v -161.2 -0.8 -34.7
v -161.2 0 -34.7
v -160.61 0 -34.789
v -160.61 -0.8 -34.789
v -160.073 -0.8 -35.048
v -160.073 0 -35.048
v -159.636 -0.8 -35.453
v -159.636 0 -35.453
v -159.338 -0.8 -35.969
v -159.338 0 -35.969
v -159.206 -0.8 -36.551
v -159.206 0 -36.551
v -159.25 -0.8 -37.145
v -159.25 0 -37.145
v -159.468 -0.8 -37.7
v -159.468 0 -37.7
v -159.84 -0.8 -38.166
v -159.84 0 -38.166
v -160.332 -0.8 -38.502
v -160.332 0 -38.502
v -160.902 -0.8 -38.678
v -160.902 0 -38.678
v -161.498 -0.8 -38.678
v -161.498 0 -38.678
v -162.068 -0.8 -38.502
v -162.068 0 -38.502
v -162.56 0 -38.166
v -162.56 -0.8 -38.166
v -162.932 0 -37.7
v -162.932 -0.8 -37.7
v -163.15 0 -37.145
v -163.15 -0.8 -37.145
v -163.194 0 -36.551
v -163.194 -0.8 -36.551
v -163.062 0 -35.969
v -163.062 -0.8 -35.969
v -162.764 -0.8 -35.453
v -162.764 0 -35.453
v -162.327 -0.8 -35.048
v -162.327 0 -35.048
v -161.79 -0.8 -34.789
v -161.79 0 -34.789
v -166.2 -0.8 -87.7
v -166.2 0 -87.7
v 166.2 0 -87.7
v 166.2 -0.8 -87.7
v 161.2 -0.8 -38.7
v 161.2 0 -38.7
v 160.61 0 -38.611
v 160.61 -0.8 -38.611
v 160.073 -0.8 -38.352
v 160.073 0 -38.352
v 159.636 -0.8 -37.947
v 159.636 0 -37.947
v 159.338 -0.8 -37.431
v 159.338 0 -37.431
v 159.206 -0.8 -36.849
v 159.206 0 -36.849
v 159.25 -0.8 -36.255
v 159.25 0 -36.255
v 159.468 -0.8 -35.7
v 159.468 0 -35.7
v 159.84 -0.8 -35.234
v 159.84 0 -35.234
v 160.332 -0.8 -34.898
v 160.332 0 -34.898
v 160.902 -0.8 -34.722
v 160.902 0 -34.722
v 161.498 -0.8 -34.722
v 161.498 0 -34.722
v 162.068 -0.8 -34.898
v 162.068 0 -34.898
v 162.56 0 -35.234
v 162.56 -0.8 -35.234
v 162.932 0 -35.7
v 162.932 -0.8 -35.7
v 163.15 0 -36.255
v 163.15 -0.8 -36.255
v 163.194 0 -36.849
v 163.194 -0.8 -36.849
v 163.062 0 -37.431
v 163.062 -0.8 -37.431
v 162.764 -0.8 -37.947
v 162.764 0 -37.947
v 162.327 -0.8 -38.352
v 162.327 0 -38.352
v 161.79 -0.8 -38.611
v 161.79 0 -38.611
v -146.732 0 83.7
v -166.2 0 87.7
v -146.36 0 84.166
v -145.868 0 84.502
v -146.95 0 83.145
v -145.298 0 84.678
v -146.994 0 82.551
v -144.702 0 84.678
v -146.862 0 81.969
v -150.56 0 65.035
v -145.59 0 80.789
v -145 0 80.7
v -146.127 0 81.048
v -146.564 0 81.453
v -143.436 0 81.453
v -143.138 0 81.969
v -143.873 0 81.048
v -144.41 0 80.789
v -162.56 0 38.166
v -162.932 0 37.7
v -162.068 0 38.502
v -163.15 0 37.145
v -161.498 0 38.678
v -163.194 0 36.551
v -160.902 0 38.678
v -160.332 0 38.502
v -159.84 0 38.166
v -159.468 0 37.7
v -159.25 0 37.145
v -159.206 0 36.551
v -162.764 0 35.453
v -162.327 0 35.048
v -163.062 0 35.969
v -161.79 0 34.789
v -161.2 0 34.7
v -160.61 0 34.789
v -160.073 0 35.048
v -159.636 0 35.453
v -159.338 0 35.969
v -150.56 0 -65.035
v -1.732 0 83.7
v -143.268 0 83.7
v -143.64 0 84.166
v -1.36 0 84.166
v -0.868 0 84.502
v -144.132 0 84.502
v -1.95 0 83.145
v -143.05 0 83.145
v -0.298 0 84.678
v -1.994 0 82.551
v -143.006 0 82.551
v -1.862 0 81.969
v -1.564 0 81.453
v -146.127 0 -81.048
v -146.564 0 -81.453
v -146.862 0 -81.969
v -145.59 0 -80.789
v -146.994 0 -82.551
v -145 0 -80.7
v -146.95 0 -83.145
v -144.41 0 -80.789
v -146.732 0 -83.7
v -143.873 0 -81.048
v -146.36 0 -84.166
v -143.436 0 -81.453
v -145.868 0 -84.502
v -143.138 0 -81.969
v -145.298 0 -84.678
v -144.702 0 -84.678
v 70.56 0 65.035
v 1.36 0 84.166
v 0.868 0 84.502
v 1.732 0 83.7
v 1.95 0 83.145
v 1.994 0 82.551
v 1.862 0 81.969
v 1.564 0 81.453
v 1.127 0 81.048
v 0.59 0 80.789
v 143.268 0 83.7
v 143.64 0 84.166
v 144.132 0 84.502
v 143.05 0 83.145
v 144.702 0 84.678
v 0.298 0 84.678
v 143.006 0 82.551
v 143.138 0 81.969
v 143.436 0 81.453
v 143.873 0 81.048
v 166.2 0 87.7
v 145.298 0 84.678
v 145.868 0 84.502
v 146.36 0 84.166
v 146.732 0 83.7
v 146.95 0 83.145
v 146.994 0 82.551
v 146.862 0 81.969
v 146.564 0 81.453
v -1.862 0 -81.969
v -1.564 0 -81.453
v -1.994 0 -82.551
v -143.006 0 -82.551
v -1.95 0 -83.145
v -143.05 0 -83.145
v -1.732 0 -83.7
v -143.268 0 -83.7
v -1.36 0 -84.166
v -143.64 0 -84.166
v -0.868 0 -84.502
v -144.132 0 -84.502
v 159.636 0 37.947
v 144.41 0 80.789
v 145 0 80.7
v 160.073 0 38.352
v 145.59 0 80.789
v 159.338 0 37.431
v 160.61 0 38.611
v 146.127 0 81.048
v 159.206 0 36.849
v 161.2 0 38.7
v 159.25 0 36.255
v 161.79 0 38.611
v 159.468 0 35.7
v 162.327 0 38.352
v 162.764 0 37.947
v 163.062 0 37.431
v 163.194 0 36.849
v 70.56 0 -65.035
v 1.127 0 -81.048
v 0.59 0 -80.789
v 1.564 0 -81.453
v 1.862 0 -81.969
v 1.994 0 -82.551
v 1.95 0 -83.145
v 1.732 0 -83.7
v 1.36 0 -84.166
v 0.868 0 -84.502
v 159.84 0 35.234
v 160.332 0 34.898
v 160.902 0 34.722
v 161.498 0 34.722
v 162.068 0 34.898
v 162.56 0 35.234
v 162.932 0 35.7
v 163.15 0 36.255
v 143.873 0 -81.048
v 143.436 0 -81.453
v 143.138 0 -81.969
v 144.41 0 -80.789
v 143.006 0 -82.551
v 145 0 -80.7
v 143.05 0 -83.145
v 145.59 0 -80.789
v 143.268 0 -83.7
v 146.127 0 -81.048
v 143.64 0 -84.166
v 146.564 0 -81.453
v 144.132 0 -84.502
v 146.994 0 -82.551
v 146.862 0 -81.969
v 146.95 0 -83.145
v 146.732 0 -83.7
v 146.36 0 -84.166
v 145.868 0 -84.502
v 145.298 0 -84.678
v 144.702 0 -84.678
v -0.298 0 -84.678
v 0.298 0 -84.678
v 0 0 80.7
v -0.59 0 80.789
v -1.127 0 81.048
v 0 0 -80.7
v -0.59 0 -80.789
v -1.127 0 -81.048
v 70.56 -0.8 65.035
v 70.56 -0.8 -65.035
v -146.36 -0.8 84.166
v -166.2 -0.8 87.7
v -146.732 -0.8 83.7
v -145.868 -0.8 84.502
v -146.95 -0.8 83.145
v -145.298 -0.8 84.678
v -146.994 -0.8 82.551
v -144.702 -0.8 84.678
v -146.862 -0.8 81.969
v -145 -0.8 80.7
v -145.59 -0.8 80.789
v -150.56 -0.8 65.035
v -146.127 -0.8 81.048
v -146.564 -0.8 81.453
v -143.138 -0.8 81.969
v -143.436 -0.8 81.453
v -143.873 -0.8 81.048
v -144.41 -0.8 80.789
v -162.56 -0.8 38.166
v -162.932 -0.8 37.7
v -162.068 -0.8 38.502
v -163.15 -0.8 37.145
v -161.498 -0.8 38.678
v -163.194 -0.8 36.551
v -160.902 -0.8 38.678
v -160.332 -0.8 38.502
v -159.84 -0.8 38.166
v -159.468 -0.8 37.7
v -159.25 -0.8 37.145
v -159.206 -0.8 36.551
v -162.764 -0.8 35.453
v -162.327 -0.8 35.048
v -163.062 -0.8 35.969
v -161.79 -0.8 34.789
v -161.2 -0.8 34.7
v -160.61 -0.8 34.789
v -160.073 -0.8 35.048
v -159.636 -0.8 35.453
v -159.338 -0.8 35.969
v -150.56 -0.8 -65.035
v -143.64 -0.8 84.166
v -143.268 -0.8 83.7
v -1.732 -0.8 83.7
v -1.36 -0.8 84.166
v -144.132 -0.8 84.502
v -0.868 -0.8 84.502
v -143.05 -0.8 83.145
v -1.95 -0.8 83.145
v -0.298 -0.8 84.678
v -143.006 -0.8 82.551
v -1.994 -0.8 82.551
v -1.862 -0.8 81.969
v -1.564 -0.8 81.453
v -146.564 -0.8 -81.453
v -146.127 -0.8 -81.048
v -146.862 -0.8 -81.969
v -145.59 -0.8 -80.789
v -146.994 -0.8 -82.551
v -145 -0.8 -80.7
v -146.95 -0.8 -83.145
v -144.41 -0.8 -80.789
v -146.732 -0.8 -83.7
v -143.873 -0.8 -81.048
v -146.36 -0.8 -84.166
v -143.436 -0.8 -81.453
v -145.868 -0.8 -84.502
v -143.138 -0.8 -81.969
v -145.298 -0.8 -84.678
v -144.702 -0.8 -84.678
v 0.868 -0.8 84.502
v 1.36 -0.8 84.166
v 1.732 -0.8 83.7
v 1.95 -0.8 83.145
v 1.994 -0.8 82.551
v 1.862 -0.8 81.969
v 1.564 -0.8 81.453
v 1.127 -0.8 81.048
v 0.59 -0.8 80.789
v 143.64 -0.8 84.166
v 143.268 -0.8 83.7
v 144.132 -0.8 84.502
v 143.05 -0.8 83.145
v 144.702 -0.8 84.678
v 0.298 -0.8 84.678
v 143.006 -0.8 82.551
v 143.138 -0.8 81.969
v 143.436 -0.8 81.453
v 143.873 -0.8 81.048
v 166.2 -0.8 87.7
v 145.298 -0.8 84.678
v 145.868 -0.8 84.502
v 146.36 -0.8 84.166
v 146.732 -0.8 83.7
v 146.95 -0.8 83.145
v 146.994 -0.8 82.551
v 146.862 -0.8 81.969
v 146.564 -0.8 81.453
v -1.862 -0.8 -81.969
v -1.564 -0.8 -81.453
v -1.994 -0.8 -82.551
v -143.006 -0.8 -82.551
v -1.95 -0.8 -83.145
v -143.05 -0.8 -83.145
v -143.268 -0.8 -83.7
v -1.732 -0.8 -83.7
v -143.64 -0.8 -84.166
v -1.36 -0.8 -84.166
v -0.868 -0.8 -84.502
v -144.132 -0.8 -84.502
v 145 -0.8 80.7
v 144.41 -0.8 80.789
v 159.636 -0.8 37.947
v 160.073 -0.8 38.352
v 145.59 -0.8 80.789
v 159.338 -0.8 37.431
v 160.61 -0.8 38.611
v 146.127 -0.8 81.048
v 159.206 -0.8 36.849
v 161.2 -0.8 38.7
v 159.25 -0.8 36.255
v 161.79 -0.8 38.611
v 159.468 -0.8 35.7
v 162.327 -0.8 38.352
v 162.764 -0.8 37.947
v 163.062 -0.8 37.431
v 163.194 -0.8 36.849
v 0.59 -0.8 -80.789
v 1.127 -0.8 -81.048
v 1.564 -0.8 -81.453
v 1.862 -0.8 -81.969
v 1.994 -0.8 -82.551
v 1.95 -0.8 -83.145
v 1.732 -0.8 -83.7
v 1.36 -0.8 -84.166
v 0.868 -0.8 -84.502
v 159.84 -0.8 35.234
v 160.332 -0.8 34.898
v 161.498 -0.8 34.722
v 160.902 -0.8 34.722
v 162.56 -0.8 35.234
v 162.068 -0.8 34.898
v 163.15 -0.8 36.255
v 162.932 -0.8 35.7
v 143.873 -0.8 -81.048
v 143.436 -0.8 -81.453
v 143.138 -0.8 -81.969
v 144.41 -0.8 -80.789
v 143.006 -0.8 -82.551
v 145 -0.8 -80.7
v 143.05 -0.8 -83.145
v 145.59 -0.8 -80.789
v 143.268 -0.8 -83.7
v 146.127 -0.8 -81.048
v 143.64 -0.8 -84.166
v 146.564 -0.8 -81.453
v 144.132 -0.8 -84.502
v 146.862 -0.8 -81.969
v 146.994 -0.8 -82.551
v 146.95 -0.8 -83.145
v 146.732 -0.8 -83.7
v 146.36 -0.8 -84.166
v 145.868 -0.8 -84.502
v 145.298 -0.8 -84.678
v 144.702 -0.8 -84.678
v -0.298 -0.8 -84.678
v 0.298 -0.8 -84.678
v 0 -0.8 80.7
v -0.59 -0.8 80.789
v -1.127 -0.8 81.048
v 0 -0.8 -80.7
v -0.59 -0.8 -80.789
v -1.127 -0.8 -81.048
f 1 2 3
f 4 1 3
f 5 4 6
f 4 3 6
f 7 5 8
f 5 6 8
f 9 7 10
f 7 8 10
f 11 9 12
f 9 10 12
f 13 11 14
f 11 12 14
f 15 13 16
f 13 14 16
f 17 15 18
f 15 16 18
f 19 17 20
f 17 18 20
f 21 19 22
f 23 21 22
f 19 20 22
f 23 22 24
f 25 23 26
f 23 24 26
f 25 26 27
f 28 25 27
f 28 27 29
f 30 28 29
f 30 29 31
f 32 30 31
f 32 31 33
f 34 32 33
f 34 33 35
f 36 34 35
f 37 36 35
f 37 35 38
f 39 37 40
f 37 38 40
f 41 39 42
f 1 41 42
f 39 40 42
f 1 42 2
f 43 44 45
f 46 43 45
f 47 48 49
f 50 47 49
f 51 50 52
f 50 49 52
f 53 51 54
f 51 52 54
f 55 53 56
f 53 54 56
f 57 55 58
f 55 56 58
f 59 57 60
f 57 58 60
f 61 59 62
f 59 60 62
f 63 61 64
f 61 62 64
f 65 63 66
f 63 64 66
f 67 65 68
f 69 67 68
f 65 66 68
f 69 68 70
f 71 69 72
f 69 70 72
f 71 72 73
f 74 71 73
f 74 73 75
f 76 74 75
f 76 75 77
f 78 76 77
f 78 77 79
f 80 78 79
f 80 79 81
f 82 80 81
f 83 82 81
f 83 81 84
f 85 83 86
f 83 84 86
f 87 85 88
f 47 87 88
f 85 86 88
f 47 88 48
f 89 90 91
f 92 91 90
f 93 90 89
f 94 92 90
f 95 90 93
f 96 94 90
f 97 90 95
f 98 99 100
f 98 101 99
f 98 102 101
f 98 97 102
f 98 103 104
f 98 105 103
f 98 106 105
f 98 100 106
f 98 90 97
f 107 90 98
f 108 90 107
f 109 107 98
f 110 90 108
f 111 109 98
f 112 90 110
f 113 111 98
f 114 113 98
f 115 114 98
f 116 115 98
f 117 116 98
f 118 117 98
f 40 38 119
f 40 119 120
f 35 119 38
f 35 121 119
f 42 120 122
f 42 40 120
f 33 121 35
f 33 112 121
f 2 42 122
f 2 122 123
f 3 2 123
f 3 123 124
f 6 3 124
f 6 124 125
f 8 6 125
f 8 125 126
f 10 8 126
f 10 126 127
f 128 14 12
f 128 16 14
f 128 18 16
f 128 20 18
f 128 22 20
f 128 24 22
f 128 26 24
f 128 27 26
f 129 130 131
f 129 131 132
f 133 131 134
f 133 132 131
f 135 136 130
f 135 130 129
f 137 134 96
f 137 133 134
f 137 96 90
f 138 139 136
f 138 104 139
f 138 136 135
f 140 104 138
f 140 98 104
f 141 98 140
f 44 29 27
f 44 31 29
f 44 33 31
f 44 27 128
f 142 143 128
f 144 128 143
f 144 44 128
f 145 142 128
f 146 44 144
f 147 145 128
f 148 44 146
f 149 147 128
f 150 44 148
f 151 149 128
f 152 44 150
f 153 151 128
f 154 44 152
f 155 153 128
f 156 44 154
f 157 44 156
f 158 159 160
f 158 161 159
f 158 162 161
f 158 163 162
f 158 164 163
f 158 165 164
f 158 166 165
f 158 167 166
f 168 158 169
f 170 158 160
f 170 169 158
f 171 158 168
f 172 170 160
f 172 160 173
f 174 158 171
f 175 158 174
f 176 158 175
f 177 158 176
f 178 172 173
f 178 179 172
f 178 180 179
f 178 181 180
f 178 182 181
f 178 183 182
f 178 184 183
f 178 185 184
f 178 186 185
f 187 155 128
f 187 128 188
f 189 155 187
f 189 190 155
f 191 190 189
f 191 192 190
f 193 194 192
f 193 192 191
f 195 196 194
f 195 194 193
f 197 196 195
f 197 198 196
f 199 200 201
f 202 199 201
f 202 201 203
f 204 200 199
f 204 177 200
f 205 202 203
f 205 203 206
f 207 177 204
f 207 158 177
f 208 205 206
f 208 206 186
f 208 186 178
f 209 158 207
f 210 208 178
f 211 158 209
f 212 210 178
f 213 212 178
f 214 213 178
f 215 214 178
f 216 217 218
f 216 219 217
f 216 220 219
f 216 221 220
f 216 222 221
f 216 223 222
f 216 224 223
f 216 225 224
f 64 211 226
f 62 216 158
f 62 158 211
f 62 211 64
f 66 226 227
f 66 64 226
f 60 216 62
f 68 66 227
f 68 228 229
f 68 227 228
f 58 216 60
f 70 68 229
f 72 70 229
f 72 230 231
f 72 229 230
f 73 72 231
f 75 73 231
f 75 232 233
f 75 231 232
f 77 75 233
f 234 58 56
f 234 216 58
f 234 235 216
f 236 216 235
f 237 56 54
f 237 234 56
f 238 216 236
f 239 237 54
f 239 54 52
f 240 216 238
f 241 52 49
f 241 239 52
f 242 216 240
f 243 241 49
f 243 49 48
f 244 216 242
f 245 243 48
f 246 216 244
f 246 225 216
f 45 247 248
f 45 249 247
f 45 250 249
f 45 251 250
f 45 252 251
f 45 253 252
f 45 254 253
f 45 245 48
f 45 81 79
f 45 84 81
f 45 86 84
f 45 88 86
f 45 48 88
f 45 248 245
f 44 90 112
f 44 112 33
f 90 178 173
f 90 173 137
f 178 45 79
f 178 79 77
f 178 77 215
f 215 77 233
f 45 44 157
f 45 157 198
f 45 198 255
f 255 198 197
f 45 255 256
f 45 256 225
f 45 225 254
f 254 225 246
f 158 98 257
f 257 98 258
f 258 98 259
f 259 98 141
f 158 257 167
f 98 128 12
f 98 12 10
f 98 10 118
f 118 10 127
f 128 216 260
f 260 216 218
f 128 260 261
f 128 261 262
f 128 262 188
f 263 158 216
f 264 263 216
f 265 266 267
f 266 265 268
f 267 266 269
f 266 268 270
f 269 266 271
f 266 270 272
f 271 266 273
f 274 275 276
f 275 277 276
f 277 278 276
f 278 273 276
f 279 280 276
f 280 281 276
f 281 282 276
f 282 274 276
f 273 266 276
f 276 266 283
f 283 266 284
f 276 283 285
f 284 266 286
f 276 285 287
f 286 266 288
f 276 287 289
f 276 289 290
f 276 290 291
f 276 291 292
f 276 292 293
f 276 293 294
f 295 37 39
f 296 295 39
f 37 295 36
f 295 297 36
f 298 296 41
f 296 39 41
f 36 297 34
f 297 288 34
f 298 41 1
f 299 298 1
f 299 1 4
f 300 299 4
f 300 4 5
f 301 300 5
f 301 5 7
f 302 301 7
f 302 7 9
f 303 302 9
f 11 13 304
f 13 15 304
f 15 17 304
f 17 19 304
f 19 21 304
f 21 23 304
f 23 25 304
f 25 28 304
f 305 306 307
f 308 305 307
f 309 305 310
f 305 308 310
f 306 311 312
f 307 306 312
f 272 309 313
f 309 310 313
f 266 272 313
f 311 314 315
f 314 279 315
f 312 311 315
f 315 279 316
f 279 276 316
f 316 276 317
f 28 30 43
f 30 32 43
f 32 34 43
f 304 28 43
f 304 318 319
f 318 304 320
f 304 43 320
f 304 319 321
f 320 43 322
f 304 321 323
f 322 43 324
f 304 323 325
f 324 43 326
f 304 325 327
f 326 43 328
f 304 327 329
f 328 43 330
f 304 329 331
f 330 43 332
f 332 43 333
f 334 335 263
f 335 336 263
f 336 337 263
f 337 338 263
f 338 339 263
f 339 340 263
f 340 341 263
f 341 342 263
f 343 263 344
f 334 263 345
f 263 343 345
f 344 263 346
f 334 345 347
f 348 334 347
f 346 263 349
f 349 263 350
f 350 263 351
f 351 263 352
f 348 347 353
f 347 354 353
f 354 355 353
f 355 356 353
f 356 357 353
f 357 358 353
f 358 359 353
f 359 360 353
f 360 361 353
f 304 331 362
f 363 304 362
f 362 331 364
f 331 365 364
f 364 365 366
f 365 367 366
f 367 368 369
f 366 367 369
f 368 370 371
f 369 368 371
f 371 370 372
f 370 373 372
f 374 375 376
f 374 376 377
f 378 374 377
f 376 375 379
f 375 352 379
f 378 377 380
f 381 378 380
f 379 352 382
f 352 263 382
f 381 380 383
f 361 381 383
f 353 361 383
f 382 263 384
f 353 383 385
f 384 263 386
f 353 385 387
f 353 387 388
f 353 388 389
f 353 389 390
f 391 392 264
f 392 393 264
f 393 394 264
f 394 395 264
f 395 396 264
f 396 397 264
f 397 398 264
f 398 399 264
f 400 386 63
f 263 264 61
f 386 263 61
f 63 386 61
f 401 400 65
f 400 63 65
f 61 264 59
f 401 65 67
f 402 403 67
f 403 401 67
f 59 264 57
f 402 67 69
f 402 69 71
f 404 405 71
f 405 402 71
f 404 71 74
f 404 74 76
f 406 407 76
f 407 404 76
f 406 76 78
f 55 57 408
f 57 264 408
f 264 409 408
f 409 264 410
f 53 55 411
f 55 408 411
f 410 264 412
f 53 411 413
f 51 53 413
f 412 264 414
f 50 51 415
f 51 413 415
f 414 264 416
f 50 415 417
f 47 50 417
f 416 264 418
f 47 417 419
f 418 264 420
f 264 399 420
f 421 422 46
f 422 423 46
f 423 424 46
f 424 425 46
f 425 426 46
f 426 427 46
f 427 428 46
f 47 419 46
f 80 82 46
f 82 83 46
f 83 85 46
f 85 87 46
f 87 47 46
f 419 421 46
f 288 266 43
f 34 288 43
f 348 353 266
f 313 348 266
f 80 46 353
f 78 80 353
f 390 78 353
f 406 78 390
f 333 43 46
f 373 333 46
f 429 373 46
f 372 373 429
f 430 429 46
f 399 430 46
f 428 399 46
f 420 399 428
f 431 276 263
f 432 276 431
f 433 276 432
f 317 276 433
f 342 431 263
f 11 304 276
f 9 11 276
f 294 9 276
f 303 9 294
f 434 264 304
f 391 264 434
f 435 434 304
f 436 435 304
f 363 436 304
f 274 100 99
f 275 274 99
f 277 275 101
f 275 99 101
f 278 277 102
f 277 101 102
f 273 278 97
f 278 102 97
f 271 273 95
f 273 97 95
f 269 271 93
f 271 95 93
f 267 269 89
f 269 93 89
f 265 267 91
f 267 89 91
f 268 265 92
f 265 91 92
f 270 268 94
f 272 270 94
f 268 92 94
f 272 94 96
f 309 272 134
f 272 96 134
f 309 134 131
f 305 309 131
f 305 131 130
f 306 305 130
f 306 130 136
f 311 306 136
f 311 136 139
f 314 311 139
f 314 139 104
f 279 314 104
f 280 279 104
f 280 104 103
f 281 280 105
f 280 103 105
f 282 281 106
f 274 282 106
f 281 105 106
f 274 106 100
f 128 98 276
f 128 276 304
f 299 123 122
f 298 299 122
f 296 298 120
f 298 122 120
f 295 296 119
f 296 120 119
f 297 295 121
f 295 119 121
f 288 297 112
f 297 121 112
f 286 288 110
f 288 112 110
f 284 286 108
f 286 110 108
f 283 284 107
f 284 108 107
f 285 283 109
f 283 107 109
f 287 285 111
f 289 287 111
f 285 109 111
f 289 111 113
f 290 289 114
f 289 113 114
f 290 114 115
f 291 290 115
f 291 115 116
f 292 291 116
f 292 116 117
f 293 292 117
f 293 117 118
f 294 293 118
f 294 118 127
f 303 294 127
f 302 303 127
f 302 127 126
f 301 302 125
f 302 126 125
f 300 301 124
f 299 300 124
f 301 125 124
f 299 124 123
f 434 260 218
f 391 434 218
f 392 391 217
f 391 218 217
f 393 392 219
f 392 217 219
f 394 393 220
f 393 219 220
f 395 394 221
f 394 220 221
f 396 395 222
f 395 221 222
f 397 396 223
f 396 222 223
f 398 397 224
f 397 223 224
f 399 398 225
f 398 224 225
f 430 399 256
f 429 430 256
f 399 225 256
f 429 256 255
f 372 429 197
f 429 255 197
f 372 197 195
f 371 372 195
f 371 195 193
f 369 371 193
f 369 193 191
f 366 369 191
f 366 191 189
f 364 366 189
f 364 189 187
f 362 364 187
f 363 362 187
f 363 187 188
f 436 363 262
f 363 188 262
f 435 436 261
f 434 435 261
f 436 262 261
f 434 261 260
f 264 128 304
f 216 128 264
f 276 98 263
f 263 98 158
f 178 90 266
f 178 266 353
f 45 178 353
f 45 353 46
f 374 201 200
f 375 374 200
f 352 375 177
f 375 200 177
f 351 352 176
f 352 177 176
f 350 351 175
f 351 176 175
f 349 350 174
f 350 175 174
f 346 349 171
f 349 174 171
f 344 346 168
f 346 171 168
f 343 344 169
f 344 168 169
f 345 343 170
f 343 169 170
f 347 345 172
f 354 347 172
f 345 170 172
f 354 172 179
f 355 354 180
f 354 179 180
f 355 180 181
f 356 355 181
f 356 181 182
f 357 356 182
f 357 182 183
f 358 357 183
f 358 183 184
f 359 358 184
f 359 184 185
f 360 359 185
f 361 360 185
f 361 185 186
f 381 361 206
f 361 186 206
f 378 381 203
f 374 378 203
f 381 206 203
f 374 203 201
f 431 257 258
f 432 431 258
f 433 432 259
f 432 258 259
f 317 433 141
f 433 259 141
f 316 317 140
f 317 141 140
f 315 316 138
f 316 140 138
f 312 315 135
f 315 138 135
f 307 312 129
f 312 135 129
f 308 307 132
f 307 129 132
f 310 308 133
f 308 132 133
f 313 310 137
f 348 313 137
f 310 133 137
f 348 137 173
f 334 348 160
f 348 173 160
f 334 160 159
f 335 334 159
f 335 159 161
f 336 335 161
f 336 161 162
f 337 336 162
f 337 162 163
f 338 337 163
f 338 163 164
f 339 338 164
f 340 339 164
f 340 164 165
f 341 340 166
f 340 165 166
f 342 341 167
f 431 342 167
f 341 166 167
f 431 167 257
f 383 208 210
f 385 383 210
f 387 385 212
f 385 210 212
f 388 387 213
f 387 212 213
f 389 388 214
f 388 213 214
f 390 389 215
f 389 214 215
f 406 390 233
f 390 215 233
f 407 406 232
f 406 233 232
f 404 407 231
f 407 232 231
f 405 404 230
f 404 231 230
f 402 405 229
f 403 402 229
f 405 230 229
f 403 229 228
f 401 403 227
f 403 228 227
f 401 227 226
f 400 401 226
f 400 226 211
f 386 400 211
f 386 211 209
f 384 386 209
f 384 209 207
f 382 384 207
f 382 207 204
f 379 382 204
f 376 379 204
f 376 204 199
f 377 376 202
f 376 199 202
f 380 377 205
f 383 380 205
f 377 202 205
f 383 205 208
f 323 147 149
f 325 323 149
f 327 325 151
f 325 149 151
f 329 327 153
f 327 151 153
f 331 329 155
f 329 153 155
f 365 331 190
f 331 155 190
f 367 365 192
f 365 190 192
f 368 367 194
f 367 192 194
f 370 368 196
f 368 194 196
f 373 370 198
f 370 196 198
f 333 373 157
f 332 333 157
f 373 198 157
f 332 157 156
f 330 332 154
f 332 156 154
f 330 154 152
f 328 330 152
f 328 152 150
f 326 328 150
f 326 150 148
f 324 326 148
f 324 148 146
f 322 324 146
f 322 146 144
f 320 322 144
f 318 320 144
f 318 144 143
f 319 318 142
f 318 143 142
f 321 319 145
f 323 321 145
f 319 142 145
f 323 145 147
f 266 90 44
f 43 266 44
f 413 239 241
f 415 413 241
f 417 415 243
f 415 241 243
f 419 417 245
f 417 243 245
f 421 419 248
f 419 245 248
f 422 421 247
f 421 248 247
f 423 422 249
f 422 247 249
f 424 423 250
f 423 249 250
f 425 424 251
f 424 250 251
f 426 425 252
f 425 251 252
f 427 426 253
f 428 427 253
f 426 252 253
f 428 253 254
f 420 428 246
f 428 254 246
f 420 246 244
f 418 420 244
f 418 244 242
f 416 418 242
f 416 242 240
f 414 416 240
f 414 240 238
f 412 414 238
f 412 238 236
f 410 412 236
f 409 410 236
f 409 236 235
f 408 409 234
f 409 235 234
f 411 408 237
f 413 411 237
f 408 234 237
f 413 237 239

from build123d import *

# Parameters (mm, degrees)
SKETCH1_W          = 332.4
SKETCH1_H          = 175.4
SKETCH1_R          = 2
BASE_FLANGE1_DEPTH = 0.8
SKETCH2_W          = 221.12
SKETCH2_H          = 130.07
CUT_EXTRUDE1_DEPTH = 10


# Sheet-metal steps are written as plain solids
with BuildPart() as part:
    # Sketch1 → Base-Flange1 (new body)
    with BuildSketch(Plane(origin=(0, 0, 0), x_dir=(1, 0, 0), z_dir=(0, 1, 0))):
        Rectangle(SKETCH1_W, SKETCH1_H)
        with Locations(Location((0, 82.7, 0), (0, 0, 270))):
            Circle(SKETCH1_R, mode=Mode.SUBTRACT)
        with Locations(Location((145, 82.7, 0), (0, 0, 270))):
            Circle(SKETCH1_R, mode=Mode.SUBTRACT)
        with Locations(Location((-145, 82.7, 0), (0, 0, 270))):
            Circle(SKETCH1_R, mode=Mode.SUBTRACT)
        with Locations(Location((-161.2, 36.7, 0), (0, 0, 270))):
            Circle(SKETCH1_R, mode=Mode.SUBTRACT)
        with Locations(Location((161.2, 36.7, 0), (0, 0, 90))):
            Circle(SKETCH1_R, mode=Mode.SUBTRACT)
        with Locations(Location((161.2, -36.7, 0), (0, 0, 270))):
            Circle(SKETCH1_R, mode=Mode.SUBTRACT)
        with Locations(Location((145, -82.7, 0), (0, 0, 90))):
            Circle(SKETCH1_R, mode=Mode.SUBTRACT)
        with Locations(Location((0, -82.7, 0), (0, 0, 90))):
            Circle(SKETCH1_R, mode=Mode.SUBTRACT)
        with Locations(Location((-145, -82.7, 0), (0, 0, 90))):
            Circle(SKETCH1_R, mode=Mode.SUBTRACT)
        with Locations(Location((-161.2, -36.7, 0), (0, 0, 90))):
            Circle(SKETCH1_R, mode=Mode.SUBTRACT)
    extrude(amount=-BASE_FLANGE1_DEPTH)

    # Sketch2 → Cut-Extrude1 (cut)
    with BuildSketch(Plane(origin=(0, 0, 0), x_dir=(1, 0, 0), z_dir=(0, 1, 0))):
        with Locations((-40, 0)):
            Rectangle(SKETCH2_W, SKETCH2_H)
    extrude(amount=-CUT_EXTRUDE1_DEPTH, mode=Mode.SUBTRACT)


solid = part.part
